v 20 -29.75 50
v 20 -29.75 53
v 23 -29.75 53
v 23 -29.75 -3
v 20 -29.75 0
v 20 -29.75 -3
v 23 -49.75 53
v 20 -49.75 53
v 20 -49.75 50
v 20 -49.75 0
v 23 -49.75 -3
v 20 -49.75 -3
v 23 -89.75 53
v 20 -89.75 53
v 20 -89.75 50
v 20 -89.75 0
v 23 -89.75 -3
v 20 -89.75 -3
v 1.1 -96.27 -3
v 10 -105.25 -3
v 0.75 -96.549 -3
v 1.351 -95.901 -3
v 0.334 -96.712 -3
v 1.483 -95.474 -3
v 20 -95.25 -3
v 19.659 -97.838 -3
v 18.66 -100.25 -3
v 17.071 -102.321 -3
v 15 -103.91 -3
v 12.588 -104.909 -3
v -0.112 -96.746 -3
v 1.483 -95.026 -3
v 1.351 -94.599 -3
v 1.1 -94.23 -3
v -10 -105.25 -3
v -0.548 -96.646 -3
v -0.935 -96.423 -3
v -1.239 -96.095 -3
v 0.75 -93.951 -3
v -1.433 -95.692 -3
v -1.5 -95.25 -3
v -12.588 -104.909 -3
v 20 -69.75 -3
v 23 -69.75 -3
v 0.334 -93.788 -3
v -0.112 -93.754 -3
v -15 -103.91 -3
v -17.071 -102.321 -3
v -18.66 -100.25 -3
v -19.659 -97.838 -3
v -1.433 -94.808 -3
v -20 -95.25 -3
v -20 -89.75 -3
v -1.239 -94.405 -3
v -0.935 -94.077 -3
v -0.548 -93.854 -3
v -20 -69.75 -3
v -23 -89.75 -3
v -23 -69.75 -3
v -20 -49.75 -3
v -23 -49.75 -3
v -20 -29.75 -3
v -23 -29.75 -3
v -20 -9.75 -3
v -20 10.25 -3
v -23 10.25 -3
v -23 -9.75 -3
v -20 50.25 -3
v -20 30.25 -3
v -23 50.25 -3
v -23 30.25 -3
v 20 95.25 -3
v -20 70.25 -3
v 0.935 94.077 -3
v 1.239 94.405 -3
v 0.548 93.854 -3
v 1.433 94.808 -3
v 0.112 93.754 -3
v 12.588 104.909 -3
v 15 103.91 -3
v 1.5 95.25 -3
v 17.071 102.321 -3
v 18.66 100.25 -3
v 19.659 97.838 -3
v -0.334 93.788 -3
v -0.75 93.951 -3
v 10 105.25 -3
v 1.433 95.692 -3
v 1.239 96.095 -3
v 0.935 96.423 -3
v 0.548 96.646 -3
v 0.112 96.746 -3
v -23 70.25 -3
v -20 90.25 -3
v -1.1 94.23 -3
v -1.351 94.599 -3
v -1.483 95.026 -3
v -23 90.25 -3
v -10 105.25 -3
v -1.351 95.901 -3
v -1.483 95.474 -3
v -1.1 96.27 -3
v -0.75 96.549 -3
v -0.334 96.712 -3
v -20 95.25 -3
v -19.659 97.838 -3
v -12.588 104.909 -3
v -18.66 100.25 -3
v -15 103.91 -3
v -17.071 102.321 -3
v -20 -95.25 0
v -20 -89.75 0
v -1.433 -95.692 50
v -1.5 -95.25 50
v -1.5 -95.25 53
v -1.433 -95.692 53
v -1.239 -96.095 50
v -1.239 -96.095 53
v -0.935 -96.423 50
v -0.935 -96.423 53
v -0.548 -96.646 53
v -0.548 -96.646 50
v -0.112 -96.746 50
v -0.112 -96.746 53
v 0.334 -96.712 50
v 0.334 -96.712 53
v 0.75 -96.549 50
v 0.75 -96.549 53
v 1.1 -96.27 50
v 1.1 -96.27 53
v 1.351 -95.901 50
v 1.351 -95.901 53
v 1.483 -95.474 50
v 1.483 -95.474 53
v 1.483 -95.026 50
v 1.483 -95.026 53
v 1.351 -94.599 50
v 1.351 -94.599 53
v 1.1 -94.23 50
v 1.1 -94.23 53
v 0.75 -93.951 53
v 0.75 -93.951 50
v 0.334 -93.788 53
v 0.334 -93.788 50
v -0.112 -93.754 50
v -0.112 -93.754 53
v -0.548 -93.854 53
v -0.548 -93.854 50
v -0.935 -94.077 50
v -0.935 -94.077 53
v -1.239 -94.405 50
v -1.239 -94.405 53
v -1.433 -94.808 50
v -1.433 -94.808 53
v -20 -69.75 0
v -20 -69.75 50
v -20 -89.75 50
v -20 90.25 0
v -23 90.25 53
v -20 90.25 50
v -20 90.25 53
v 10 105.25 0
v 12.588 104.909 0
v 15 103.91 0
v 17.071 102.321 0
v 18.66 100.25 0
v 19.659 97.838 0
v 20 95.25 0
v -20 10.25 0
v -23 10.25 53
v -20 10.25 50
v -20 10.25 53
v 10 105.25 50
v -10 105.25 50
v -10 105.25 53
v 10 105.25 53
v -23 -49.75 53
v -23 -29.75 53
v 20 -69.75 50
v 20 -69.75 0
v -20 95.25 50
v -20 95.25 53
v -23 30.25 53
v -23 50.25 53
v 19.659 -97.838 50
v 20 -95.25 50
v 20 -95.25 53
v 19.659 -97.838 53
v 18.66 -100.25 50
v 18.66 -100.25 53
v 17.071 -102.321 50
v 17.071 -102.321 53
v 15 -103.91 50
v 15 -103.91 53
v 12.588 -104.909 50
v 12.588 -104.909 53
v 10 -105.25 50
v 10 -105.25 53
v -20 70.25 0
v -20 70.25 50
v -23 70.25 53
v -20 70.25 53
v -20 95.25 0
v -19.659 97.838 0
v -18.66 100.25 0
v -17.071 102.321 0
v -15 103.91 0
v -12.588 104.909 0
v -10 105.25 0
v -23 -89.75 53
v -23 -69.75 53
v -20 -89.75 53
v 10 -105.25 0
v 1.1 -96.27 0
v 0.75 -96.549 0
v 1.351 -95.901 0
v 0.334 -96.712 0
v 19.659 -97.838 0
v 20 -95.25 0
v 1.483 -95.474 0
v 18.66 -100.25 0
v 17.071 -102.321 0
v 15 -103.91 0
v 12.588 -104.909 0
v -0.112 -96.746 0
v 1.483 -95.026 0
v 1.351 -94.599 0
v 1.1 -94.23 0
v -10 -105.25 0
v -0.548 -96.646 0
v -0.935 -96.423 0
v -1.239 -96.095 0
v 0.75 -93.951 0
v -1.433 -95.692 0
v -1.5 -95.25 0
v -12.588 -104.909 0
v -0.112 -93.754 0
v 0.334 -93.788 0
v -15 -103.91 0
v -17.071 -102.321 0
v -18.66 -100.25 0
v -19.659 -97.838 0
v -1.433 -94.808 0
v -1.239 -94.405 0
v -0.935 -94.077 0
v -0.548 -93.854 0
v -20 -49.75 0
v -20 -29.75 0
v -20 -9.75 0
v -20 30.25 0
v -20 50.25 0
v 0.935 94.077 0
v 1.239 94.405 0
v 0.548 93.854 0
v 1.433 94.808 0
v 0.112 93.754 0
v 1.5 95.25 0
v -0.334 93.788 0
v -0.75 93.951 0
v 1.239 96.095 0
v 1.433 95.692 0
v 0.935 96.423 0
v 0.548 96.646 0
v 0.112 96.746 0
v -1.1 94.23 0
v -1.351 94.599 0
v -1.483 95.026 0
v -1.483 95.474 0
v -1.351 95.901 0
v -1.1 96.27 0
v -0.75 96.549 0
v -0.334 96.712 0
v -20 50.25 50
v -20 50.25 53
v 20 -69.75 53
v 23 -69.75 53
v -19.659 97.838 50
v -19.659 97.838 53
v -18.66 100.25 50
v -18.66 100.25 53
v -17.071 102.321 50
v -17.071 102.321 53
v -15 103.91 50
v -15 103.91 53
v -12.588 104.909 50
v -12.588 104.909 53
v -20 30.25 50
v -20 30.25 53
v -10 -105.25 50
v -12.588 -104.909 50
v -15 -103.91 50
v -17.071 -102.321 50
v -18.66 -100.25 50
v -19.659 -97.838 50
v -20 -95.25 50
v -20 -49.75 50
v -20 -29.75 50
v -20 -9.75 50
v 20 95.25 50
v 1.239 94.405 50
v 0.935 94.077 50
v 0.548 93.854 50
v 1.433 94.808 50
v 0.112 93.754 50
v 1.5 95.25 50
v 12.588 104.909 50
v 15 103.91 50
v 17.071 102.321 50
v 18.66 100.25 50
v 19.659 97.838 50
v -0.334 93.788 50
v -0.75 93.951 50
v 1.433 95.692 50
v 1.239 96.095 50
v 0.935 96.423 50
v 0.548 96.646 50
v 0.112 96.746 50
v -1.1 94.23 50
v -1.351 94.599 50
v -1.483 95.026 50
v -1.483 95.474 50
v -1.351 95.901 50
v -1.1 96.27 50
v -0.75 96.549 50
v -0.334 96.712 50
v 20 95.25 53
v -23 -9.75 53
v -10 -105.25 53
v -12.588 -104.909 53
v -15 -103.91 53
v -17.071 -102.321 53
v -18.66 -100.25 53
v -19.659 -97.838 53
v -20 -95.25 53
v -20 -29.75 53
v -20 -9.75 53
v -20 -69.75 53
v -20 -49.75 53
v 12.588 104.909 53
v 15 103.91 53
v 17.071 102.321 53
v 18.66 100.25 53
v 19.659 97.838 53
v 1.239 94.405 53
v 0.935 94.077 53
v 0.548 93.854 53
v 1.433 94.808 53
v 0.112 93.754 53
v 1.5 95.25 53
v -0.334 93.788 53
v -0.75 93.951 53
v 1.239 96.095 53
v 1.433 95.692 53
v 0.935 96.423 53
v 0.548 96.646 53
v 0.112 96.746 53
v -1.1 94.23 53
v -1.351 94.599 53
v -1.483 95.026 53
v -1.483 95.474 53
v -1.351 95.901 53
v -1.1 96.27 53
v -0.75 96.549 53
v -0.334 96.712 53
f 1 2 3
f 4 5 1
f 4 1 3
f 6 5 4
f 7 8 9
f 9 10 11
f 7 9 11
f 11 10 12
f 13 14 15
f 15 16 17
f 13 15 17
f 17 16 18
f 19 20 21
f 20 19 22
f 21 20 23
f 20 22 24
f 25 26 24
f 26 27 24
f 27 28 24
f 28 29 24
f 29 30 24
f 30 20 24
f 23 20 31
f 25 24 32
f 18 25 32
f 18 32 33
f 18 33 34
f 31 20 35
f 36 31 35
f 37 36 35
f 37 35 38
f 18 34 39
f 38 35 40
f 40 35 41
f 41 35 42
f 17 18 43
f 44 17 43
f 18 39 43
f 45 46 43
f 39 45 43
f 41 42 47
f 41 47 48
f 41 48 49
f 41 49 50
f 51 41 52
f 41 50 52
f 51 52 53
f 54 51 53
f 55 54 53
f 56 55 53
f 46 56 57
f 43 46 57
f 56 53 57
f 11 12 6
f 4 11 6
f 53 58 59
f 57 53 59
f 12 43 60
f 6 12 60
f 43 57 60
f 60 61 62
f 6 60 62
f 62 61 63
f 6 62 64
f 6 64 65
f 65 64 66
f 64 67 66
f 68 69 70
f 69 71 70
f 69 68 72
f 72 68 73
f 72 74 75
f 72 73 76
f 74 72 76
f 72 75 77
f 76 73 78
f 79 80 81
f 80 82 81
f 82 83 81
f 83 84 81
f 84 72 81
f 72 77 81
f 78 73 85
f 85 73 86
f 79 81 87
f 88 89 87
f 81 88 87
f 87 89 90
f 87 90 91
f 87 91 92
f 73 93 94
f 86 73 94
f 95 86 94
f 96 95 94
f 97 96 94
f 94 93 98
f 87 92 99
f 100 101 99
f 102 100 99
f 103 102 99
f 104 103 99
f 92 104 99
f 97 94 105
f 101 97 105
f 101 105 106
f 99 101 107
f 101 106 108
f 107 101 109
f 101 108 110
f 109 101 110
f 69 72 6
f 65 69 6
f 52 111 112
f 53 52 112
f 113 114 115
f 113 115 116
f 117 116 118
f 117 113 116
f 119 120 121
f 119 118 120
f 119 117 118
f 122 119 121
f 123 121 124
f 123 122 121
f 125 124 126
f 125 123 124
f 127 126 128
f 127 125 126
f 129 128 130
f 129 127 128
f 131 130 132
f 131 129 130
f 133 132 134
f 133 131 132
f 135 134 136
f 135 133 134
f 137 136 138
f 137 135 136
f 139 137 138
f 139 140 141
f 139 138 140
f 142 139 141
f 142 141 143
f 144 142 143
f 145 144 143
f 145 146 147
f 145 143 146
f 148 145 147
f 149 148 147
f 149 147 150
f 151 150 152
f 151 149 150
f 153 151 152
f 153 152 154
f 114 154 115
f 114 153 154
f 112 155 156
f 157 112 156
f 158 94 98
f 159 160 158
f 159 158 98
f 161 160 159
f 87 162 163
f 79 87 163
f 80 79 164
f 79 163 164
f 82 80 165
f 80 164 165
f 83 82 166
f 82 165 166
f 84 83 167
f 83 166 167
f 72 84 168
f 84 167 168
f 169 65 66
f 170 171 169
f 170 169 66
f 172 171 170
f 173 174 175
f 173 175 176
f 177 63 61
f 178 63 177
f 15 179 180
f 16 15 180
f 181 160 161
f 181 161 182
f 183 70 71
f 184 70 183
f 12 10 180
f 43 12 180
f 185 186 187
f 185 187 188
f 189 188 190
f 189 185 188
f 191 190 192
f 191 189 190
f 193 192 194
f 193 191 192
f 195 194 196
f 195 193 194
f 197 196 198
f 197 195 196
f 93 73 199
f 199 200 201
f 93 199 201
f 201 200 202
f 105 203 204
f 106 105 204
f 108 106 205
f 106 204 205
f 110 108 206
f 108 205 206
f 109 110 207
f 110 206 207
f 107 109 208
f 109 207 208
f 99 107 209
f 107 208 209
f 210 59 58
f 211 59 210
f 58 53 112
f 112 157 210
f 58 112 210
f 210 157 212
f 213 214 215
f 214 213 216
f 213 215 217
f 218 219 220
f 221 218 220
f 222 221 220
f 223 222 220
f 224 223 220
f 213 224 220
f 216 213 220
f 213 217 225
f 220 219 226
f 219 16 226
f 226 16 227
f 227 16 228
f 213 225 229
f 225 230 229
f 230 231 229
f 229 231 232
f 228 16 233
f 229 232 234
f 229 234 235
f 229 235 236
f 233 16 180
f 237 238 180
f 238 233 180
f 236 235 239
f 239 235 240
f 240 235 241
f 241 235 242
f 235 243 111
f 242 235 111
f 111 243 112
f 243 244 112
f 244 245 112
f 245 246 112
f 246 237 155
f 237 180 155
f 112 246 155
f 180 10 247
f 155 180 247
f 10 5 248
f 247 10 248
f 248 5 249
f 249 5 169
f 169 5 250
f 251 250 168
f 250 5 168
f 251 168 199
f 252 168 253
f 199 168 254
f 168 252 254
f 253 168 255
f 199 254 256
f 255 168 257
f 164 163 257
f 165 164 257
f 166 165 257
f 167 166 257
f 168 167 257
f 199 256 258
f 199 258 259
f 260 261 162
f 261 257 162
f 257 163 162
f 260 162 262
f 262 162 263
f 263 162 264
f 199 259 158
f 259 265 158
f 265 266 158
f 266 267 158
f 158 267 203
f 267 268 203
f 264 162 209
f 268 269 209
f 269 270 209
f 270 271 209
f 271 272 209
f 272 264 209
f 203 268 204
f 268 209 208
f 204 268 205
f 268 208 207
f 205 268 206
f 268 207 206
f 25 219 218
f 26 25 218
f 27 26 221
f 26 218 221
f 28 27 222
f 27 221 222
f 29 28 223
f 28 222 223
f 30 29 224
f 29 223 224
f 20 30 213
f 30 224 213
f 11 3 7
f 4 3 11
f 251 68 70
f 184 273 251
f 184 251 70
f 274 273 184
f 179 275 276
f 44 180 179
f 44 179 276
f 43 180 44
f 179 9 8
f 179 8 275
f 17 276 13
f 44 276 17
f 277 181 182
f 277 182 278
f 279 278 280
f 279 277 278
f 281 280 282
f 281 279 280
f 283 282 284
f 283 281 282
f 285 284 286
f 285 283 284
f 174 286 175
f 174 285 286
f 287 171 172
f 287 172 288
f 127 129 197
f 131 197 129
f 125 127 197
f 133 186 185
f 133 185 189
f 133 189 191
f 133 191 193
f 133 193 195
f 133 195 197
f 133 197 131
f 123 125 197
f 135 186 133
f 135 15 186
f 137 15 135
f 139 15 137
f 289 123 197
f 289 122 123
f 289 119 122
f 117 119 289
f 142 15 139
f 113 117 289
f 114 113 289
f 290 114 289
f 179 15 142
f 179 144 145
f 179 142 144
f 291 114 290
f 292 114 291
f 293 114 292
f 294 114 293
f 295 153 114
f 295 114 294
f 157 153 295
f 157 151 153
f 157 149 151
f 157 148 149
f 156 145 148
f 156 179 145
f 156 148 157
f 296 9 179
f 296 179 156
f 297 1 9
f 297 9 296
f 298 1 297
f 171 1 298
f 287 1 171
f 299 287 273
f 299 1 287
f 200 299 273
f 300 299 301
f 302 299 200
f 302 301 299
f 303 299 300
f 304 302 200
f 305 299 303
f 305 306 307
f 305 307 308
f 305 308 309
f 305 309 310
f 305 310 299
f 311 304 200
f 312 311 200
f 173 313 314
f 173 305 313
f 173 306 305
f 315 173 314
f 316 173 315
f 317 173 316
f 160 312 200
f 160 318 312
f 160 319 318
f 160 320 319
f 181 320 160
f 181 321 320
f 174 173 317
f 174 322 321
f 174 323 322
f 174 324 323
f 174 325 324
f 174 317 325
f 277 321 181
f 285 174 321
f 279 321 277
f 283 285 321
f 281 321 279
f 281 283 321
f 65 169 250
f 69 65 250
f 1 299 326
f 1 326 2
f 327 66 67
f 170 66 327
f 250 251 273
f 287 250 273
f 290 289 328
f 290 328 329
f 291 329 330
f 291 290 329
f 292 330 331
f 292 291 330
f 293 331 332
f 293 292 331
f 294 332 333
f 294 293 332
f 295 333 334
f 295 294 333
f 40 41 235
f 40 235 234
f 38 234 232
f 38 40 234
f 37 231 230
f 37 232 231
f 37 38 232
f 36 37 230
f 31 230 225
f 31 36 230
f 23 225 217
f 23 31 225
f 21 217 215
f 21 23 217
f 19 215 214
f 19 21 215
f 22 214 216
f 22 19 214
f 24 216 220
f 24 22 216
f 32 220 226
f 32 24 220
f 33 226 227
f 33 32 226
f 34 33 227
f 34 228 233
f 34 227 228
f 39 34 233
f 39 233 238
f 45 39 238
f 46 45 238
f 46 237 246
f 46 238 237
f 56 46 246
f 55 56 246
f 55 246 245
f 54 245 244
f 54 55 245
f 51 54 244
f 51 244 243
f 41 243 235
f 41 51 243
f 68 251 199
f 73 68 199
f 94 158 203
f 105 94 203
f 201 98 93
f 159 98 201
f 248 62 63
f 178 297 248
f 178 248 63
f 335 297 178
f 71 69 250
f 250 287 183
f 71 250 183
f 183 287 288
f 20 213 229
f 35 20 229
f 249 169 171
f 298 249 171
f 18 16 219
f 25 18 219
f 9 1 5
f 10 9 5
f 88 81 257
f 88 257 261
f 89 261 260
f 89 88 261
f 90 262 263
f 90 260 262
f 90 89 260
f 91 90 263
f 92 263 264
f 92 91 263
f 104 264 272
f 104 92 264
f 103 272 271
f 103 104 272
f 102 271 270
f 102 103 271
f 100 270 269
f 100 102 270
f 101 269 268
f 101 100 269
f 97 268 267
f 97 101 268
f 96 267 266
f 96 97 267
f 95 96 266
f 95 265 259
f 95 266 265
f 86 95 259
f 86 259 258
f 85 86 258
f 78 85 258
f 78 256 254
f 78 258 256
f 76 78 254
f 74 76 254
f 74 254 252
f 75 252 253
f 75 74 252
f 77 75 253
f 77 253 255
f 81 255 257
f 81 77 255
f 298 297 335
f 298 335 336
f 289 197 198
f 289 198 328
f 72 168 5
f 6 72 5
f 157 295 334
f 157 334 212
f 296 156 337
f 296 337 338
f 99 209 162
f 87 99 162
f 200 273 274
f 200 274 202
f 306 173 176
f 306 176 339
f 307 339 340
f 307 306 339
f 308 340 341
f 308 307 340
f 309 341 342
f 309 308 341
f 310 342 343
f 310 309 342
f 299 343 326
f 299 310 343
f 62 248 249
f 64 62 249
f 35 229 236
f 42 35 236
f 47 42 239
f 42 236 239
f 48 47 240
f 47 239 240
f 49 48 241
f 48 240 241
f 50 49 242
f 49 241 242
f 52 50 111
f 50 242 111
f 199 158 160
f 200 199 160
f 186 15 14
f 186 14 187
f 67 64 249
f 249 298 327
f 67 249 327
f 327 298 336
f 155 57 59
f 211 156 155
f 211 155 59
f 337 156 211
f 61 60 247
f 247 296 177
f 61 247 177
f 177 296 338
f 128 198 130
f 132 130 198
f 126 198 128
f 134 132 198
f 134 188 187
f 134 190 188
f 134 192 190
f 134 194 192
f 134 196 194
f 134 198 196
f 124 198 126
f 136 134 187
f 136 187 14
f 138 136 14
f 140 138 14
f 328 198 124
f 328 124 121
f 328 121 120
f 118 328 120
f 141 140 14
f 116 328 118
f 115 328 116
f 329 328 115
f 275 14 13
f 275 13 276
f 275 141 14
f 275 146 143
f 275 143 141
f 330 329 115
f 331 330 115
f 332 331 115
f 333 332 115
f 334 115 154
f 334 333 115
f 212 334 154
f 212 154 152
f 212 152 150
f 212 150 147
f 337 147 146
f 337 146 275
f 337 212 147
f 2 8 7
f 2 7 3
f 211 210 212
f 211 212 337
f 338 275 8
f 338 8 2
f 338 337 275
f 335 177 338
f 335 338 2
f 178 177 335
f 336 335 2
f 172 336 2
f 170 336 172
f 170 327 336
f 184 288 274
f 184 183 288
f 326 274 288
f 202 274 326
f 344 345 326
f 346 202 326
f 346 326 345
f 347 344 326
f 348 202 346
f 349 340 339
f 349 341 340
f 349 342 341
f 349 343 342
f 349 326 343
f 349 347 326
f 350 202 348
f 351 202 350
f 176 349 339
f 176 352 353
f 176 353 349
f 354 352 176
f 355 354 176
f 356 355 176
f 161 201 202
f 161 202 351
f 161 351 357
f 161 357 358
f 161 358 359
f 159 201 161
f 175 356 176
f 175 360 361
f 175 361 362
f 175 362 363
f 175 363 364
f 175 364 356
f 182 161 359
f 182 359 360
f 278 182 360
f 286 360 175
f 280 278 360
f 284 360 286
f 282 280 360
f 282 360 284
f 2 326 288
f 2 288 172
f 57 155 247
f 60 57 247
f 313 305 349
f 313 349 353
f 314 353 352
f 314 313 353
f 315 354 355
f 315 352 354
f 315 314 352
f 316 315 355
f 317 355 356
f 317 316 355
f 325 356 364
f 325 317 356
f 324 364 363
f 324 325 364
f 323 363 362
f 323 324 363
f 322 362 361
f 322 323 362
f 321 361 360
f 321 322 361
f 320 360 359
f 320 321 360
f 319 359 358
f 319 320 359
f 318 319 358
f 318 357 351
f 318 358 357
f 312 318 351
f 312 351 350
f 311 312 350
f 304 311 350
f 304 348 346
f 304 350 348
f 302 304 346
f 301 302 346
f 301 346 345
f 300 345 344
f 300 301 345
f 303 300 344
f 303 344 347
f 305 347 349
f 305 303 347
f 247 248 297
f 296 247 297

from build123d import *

# Parameters (mm, degrees)
BOSS_EXTRUDE1_START     = 50
BOSS_EXTRUDE1_DEPTH     = 3
BOSS_EXTRUDE2_DEPTH     = 3
CUT_EXTRUDE1_DEPTH      = 120.526409216
CUT_EXTRUDE1_DEPTH_BACK = 120.526409216
SKETCH2_R               = 1.5
SKETCH3_W               = 56
SKETCH3_H               = 20
BOSS_EXTRUDE4_DEPTH     = 3
SKETCH4_W               = 56
SKETCH4_H               = 20
BOSS_EXTRUDE5_DEPTH     = 3


with BuildPart() as part:
    # Sketch1 → Boss-Extrude1 (new body)
    with BuildSketch(Plane.XY.offset(BOSS_EXTRUDE1_START)):
        with BuildLine():
            Line((-10, 105.25), (10, 105.25))
            ThreePointArc((10, 105.25), (17.071067812, 102.321067812), (20, 95.25))
            Line((20, 95.25), (20, -95.25))
            ThreePointArc((20, -95.25), (17.071067812, -102.321067812), (10, -105.25))
            Line((10, -105.25), (-10, -105.25))
            ThreePointArc((-10, -105.25), (-17.071067812, -102.321067812), (-20, -95.25))
            Line((-20, -95.25), (-20, 95.25))
            ThreePointArc((-20, 95.25), (-17.071067812, 102.321067812), (-10, 105.25))
        make_face()
    extrude(amount=BOSS_EXTRUDE1_DEPTH)


with BuildPart() as body_2:
    # Sketch1<3> → Boss-Extrude2 (new body)
    with BuildSketch(Plane.XY):
        with BuildLine():
            Line((-10, 105.25), (10, 105.25))
            ThreePointArc((10, 105.25), (17.071067812, 102.321067812), (20, 95.25))
            Line((20, 95.25), (20, -95.25))
            ThreePointArc((20, -95.25), (17.071067812, -102.321067812), (10, -105.25))
            Line((10, -105.25), (-10, -105.25))
            ThreePointArc((-10, -105.25), (-17.071067812, -102.321067812), (-20, -95.25))
            Line((-20, -95.25), (-20, 95.25))
            ThreePointArc((-20, 95.25), (-17.071067812, 102.321067812), (-10, 105.25))
        make_face()
    extrude(amount=-BOSS_EXTRUDE2_DEPTH)


with BuildPart() as cut_extrude1_tool:
    # Sketch2 → Cut-Extrude1 (new, two sides: drawn at the far end of the back side and taken through both)
    with BuildSketch(Plane.XY.offset(-CUT_EXTRUDE1_DEPTH_BACK)):
        with Locations((0, 95.25)):
            Circle(SKETCH2_R)
        with Locations((0, -95.25)):
            Circle(SKETCH2_R)
    extrude(amount=CUT_EXTRUDE1_DEPTH + CUT_EXTRUDE1_DEPTH_BACK)


with BuildPart() as part_1:
    add(part.part)

    # Cut-Extrude1: cut by cut_extrude1_tool
    add(cut_extrude1_tool.part, mode=Mode.SUBTRACT)



with BuildPart() as body_2_1:
    add(body_2.part)

    # Cut-Extrude1: cut by cut_extrude1_tool
    add(cut_extrude1_tool.part, mode=Mode.SUBTRACT)


with BuildPart() as part_2:
    add(part_1.part)

    add(body_2_1.part)  # Boss-Extrude4 merges body 2
    # Sketch3 → Boss-Extrude4 (add)
    with BuildSketch(Plane.ZY.offset(20)):
        with Locations((25, 80.25)):
            Rectangle(SKETCH3_W, SKETCH3_H)
        with Locations((25, 40.25)):
            Rectangle(SKETCH3_W, SKETCH3_H)
        with Locations((25, 0.25)):
            Rectangle(SKETCH3_W, SKETCH3_H)
        with Locations((25, -39.75)):
            Rectangle(SKETCH3_W, SKETCH3_H)
        with Locations((25, -79.75)):
            Rectangle(SKETCH3_W, SKETCH3_H)
    extrude(amount=BOSS_EXTRUDE4_DEPTH)

    # Sketch4 → Boss-Extrude5 (add)
    with BuildSketch(Plane(origin=(20, 0, 0), x_dir=(0, 0, -1), z_dir=(1, 0, 0))):
        with Locations((-25, -79.75)):
            Rectangle(SKETCH4_W, SKETCH4_H)
        with Locations((-25, -39.75)):
            Rectangle(SKETCH4_W, SKETCH4_H)
    extrude(amount=BOSS_EXTRUDE5_DEPTH)


solid = part_2.part
